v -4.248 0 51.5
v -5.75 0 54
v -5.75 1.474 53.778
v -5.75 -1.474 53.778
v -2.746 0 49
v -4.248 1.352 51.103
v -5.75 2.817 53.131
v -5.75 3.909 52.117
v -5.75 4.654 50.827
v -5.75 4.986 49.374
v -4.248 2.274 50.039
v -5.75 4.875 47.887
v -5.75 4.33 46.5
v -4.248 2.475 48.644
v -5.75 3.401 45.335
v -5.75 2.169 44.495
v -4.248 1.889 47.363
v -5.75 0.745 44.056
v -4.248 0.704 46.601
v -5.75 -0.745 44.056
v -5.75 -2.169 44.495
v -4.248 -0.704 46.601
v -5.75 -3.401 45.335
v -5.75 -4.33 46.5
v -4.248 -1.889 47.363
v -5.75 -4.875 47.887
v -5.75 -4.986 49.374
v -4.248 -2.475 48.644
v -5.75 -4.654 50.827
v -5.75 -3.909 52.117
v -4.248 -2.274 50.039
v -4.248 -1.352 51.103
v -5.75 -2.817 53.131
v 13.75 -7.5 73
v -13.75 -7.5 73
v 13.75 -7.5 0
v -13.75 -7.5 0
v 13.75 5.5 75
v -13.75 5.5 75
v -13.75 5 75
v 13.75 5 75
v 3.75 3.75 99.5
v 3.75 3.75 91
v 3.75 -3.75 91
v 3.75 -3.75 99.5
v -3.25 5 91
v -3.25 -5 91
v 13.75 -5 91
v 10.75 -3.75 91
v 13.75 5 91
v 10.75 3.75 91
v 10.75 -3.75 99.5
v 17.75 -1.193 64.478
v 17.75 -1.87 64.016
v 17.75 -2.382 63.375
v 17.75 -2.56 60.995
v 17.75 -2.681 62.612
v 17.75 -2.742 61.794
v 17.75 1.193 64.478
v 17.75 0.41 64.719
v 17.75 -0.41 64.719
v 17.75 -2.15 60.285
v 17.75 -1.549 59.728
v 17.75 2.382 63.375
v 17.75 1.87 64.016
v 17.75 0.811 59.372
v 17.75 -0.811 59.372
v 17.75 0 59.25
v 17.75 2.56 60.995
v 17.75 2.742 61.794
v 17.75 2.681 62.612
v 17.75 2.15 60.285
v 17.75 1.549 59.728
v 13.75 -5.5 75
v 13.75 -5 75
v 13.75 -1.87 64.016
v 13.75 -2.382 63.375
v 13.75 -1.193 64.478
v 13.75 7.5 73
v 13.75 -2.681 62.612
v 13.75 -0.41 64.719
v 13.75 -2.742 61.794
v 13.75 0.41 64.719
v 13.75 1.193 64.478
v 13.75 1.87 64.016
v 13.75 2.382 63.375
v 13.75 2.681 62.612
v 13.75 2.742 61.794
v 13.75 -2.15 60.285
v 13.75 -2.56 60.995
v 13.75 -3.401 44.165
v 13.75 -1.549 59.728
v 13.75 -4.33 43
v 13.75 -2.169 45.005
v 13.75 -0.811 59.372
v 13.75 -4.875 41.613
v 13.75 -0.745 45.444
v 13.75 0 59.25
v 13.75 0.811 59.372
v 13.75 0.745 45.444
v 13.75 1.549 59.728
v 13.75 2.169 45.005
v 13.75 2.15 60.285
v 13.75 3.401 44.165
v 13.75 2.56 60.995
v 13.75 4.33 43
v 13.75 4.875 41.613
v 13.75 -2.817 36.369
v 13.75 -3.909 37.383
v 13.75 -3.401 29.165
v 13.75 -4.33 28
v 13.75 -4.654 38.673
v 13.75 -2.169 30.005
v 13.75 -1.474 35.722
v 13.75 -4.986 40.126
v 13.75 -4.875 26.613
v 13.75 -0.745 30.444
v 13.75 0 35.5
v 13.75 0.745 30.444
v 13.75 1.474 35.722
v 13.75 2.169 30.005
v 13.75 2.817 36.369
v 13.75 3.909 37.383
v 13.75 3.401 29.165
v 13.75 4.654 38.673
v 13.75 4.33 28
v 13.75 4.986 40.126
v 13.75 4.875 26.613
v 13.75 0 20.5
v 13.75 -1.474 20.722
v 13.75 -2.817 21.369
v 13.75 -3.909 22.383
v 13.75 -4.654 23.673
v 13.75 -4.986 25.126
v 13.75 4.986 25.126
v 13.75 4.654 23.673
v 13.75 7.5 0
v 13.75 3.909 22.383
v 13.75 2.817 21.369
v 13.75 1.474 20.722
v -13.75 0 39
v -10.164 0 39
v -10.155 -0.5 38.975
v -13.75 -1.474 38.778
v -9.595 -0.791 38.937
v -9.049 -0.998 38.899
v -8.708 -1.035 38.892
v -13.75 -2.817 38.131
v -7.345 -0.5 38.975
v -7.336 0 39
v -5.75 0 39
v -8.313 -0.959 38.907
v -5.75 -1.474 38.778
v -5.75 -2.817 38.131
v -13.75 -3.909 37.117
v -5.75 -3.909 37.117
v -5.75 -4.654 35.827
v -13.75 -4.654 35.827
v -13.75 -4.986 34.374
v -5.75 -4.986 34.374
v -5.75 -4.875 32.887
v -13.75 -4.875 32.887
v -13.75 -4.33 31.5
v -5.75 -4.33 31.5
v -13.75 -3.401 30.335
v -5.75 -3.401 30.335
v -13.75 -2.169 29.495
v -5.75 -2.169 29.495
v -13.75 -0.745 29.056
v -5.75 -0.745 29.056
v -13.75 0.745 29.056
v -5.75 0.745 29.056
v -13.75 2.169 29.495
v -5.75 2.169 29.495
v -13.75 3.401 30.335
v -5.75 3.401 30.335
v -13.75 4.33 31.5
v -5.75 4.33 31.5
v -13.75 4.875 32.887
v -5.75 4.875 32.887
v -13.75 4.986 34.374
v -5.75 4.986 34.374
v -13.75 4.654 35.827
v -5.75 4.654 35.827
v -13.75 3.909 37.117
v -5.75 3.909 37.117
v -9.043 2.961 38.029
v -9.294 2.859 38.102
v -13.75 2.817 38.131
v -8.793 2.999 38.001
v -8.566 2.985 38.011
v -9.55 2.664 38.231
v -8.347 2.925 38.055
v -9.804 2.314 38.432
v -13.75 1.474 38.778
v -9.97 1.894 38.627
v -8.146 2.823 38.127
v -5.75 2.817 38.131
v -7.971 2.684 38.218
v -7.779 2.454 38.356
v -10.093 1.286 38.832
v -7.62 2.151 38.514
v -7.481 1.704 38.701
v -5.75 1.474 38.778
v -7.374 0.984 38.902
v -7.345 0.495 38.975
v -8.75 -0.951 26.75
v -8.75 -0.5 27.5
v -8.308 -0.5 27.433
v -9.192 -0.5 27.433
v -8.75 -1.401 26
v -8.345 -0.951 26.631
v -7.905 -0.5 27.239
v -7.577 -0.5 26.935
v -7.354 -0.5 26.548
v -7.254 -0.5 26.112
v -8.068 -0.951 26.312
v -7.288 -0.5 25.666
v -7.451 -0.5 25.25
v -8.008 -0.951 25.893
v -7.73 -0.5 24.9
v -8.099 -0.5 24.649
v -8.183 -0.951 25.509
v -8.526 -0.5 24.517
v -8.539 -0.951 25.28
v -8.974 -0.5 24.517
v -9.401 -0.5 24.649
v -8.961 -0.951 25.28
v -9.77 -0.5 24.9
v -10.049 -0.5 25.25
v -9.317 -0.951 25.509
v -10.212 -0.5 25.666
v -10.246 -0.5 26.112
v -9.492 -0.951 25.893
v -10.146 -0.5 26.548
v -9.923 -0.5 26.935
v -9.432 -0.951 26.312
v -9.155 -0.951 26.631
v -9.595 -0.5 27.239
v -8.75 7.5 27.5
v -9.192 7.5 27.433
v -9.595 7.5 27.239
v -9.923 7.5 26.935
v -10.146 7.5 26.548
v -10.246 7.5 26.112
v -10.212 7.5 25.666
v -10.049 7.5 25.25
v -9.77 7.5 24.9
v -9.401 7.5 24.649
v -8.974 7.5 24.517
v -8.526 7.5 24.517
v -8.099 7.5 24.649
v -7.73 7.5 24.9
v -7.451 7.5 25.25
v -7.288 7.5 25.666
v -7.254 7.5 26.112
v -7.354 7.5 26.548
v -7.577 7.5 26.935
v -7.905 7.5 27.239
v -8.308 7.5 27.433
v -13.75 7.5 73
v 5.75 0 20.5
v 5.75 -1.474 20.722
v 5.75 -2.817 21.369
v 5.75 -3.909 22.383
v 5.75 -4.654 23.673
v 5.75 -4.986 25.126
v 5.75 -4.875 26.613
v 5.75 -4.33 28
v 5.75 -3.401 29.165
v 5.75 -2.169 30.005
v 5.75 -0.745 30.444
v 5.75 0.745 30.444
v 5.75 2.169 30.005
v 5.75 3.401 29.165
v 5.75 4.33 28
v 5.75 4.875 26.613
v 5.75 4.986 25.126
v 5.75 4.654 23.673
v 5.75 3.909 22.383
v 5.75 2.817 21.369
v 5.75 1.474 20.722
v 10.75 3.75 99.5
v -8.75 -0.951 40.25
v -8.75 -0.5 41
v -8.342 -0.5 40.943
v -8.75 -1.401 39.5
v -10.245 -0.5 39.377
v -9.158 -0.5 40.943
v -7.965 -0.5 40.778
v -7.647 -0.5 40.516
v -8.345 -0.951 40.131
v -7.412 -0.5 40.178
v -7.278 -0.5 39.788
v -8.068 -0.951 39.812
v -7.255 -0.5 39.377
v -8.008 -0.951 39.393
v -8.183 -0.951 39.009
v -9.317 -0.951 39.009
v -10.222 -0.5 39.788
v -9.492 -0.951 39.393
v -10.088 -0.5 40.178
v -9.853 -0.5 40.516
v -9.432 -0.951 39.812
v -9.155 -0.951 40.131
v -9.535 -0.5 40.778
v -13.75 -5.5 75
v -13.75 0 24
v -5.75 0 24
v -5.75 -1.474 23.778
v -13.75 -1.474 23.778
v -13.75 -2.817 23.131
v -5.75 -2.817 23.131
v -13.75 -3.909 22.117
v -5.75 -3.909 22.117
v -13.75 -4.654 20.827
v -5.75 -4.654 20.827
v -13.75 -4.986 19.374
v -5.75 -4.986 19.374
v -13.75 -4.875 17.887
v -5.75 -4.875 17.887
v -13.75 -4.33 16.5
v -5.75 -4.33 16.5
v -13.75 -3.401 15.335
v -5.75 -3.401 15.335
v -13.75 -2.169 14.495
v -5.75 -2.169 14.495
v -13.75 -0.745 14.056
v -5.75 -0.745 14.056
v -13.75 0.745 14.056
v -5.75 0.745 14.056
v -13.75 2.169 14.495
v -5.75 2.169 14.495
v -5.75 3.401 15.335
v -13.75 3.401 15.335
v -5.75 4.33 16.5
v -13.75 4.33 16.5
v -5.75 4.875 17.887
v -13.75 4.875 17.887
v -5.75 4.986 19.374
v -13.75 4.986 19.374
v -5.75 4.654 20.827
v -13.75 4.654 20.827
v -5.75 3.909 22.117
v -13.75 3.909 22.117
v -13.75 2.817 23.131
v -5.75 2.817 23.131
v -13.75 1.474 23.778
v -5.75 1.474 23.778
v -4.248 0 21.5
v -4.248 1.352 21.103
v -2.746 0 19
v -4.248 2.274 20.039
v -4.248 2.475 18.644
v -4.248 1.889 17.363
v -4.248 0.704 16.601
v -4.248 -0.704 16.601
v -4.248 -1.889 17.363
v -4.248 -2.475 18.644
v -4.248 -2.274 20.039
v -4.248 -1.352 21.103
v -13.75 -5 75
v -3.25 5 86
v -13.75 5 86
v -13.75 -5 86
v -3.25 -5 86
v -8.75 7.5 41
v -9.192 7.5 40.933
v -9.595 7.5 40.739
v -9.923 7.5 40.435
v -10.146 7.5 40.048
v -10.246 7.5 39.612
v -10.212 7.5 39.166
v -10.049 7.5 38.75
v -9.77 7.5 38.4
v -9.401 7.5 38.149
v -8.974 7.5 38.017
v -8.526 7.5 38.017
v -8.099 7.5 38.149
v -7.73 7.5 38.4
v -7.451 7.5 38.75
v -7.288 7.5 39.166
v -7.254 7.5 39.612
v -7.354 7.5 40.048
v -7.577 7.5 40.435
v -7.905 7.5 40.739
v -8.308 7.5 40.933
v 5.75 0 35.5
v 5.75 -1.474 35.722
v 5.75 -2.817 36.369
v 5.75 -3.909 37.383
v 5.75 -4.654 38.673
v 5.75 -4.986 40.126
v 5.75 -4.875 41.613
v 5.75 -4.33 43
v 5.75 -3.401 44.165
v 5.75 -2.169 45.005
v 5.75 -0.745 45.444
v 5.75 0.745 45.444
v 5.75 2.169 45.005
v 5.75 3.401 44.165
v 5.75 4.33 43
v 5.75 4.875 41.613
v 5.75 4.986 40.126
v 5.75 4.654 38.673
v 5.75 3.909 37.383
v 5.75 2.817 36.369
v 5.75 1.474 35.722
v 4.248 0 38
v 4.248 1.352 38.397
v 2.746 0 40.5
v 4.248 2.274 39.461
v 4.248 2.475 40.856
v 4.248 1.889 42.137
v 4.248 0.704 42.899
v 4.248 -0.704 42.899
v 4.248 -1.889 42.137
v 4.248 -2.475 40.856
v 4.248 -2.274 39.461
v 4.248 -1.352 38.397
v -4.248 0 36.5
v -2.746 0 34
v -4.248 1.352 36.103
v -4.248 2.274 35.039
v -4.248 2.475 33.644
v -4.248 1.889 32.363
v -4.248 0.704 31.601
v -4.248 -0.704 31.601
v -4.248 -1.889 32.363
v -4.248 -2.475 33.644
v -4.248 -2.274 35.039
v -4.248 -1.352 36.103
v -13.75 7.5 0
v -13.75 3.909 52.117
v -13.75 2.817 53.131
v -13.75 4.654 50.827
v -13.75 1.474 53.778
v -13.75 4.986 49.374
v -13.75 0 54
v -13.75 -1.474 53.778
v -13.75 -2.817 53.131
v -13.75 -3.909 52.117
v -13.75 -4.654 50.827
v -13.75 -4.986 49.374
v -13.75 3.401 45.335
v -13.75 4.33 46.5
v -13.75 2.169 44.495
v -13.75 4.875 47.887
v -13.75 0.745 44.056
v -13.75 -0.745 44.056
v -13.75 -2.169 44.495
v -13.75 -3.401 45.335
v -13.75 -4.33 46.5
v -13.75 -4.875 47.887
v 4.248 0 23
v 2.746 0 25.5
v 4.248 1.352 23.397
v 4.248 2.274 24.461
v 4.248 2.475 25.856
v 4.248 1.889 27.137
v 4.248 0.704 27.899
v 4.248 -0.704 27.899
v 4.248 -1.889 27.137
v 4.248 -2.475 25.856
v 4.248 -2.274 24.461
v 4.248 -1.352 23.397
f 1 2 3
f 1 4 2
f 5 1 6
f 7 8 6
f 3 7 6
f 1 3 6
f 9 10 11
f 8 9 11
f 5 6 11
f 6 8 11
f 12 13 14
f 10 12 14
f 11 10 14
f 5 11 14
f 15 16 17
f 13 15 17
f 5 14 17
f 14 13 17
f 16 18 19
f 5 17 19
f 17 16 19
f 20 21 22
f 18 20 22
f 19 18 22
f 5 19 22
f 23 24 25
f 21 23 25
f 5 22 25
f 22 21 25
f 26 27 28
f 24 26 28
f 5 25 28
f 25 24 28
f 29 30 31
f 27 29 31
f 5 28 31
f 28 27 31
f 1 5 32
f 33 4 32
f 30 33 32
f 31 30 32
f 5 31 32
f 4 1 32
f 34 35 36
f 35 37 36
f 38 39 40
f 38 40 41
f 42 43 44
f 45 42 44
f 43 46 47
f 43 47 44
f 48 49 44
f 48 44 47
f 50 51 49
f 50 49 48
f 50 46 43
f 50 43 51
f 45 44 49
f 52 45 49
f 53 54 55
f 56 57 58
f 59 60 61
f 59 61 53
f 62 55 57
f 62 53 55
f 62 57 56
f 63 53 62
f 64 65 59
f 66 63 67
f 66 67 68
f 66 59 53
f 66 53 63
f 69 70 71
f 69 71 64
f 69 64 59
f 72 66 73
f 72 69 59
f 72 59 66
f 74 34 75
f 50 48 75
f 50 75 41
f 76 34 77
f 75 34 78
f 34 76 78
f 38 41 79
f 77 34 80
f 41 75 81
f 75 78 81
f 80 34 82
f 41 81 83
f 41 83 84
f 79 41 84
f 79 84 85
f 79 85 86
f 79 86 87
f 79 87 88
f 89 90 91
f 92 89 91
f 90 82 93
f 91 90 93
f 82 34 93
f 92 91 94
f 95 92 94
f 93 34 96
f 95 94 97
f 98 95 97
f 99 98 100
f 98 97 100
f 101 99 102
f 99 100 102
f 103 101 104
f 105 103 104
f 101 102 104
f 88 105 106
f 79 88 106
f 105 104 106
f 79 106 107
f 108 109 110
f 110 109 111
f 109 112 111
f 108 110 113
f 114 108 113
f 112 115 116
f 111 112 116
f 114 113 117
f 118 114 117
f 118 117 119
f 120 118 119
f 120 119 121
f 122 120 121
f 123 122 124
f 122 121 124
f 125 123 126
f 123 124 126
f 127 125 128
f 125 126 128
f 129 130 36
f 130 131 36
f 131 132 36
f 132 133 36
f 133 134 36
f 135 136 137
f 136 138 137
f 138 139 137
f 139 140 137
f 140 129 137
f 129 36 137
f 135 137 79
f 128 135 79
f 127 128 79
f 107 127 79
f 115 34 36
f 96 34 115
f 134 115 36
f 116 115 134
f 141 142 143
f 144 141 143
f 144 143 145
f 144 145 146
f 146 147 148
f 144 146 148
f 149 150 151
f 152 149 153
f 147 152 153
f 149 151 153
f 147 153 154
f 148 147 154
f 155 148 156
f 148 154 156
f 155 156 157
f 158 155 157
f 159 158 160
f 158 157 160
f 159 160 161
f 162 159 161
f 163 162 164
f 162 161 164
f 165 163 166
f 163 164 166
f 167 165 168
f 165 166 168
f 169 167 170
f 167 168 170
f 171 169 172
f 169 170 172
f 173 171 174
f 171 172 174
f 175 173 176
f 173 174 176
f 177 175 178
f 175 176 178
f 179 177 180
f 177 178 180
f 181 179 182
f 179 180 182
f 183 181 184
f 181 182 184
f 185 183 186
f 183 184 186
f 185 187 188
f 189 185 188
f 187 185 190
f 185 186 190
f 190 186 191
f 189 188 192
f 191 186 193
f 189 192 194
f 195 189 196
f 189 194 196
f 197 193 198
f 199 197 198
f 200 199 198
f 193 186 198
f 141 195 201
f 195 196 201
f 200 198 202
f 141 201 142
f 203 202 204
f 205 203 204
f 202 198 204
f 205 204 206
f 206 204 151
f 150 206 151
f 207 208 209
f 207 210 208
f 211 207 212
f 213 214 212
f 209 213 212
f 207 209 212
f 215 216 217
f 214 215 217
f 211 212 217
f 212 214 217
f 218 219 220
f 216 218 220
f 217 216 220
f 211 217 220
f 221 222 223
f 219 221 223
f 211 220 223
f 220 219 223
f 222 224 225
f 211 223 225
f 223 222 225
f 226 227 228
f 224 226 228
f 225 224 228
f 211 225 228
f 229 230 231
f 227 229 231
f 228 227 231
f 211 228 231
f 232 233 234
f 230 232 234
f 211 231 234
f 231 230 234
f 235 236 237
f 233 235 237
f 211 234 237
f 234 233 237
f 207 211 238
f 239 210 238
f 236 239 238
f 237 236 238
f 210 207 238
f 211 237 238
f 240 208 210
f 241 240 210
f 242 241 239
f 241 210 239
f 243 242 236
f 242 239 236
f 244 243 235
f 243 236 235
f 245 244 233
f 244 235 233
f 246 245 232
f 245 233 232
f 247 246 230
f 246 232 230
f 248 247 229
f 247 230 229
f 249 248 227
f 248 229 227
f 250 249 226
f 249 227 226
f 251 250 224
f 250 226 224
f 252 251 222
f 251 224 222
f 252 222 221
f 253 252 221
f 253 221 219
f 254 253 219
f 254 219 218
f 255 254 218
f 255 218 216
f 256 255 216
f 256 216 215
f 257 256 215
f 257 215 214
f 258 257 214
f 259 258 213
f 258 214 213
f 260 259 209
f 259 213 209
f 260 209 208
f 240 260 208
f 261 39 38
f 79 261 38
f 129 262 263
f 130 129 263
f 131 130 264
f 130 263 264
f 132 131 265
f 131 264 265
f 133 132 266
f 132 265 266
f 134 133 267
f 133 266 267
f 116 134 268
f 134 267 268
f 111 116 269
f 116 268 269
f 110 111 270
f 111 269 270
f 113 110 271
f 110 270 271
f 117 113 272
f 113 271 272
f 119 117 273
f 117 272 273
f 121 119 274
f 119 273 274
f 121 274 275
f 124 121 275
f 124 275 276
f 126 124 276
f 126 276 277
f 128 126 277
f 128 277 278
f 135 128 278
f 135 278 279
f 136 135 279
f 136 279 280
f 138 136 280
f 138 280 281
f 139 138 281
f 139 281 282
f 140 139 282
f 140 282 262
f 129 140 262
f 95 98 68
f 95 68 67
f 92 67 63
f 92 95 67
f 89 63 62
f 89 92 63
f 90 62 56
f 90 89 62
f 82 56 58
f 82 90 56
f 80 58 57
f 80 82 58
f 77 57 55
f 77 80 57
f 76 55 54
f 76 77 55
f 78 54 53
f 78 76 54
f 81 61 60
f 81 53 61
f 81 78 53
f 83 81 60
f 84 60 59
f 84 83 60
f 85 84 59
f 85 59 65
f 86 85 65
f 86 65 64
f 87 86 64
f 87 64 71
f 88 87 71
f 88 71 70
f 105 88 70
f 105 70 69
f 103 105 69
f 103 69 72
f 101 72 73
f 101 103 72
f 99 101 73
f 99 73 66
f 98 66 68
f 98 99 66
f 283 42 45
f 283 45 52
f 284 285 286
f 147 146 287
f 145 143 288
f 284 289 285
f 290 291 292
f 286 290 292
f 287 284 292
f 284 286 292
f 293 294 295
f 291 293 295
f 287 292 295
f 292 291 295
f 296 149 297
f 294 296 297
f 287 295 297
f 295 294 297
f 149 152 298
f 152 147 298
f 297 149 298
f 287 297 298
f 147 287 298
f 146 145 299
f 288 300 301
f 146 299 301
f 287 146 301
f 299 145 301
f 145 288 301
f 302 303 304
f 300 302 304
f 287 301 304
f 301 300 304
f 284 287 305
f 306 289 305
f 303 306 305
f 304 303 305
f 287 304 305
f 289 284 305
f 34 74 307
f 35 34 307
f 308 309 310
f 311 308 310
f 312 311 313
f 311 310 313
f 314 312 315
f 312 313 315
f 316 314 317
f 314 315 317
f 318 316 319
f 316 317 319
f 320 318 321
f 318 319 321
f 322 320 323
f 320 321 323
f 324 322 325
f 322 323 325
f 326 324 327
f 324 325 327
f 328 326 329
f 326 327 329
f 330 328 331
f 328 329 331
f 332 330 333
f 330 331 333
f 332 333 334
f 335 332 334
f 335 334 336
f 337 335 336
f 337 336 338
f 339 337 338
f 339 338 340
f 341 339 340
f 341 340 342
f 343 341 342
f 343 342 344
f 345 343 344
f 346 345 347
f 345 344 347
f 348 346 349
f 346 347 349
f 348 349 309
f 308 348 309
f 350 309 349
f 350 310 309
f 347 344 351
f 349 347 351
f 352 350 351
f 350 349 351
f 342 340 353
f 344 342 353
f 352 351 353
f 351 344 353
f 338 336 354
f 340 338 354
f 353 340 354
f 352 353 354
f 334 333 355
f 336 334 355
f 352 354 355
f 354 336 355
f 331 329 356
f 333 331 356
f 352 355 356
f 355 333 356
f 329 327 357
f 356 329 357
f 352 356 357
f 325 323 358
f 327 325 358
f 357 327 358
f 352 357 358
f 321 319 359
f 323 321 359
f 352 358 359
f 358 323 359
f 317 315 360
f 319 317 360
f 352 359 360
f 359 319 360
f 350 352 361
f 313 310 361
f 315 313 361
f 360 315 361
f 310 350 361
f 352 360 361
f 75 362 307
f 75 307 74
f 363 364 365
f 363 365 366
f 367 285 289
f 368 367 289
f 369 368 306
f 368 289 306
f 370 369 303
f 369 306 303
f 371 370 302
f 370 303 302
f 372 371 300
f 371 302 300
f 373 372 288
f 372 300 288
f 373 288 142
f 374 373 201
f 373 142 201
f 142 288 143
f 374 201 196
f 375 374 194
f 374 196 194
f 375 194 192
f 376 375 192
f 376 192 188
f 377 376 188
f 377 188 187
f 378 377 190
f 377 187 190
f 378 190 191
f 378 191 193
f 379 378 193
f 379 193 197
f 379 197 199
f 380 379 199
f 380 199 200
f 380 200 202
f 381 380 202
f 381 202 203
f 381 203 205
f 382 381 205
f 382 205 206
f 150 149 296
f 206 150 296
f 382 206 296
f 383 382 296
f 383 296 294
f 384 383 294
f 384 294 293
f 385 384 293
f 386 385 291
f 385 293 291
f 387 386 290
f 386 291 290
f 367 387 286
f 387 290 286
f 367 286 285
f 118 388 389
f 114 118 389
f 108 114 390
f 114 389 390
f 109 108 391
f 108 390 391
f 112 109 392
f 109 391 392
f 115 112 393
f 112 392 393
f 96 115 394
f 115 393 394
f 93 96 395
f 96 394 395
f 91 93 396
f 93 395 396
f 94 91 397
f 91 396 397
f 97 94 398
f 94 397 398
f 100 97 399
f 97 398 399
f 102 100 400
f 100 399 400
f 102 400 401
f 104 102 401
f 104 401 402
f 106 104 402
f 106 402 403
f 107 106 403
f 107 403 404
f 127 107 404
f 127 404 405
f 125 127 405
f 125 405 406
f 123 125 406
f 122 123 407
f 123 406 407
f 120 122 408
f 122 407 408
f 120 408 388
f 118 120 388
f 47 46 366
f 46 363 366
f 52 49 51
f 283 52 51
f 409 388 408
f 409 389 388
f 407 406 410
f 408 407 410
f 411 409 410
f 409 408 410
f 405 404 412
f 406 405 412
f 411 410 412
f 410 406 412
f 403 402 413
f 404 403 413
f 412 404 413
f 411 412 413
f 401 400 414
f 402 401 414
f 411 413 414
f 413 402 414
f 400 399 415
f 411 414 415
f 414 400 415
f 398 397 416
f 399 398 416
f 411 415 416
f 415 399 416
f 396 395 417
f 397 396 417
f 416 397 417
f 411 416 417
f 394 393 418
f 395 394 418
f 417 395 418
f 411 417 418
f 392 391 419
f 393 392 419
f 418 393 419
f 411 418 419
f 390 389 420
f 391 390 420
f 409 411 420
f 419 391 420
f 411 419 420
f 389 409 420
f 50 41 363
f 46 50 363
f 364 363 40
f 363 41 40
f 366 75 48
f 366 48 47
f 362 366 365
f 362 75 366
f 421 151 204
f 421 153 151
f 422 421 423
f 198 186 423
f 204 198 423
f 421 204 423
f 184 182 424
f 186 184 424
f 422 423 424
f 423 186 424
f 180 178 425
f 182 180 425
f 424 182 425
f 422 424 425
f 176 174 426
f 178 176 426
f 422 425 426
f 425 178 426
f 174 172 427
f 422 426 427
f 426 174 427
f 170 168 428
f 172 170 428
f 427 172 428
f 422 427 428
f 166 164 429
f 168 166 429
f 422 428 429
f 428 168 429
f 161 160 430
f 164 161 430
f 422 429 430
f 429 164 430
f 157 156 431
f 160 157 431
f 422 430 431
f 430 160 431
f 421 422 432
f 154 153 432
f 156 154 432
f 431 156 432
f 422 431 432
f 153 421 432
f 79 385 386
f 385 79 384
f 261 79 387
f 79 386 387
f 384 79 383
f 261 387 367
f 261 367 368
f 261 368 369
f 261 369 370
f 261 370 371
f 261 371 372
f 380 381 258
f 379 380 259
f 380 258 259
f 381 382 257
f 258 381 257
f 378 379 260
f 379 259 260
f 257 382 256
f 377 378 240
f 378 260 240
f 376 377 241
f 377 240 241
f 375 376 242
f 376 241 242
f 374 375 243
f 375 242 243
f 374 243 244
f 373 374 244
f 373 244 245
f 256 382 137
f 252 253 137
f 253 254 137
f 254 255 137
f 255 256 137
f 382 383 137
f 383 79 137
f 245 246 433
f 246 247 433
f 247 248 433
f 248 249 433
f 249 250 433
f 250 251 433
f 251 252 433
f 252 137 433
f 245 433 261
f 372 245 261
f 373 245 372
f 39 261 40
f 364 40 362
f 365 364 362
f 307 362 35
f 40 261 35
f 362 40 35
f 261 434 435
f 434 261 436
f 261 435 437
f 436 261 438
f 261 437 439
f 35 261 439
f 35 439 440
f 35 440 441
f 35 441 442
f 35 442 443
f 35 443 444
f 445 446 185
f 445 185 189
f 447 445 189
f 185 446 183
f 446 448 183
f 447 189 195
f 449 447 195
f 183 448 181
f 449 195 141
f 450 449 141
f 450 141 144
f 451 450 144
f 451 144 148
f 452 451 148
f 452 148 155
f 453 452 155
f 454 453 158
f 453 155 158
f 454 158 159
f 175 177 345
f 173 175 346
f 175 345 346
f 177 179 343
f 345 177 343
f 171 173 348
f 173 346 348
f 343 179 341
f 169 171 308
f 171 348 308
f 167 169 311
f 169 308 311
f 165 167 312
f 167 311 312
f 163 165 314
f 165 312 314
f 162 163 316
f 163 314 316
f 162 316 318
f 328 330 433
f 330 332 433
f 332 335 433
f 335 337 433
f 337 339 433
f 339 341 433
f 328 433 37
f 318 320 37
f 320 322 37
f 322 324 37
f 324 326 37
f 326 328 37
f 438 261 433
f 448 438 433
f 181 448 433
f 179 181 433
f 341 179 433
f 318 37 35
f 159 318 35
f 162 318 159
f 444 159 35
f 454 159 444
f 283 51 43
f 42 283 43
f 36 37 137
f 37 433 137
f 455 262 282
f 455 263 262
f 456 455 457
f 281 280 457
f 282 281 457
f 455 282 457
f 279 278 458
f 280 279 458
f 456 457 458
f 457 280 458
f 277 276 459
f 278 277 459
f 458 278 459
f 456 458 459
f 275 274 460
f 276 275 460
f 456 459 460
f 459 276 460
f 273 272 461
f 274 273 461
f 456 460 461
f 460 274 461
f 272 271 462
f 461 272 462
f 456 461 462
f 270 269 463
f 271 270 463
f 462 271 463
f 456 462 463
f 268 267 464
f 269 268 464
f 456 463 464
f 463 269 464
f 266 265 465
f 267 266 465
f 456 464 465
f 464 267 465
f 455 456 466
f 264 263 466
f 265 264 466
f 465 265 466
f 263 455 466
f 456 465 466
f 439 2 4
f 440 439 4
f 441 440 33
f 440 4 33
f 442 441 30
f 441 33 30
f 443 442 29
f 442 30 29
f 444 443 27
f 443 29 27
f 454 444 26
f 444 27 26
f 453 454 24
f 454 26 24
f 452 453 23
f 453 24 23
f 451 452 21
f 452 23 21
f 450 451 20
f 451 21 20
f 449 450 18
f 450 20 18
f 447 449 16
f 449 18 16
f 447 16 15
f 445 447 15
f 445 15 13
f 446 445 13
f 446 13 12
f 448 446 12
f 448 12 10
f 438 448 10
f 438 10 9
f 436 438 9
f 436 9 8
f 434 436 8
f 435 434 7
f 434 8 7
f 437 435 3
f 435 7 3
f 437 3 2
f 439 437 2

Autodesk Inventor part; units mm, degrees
ref_plane "YZ Plane" through (0, 0, 0) normal (1, 0, 0) x (0, 1, 0)
ref_plane "XZ Plane" through (0, 0, 0) normal (0, 1, 0) x (-1, 0, 0)
ref_plane "XY Plane" through (0, 0, 0) normal (0, 0, 1) x (1, 0, 0)
sketch "スケッチ1" plane through (0, 0, 0) normal (0, 0, 1) x (1, 0, 0)
  line L0 (-13.75, -7.5) -> (13.75, -7.5)
  line L1 (13.75, -7.5) -> (13.75, 7.5)
  line L2 (13.75, 7.5) -> (-13.75, 7.5)
  line L3 (-13.75, 7.5) -> (-13.75, -7.5)
  line L4 (-13.75, -7.5) -> (13.75, 7.5) construction
  line L5 (13.75, -7.5) -> (-13.75, 7.5) construction
  point P0 (0, 0)
  dimension "d0" = 27.5
  dimension "d1" = 15
extrude "押し出し1" add sketch "スケッチ1" along normal blind 75
sketch "スケッチ2" plane through (0, 0, 75) normal (0, 0, 1) x (1, 0, 0)
  line L0 (-13.75, 5) -> (13.75, 5)
  line L1 (13.75, 5) -> (13.75, -5)
  line L2 (13.75, -5) -> (-13.75, -5)
  line L3 (-13.75, -5) -> (-13.75, 5)
  line L4 (-13.75, 5) -> (13.75, -5) construction
  line L5 (13.75, 5) -> (-13.75, -5) construction
  point P0 (0, 0)
  dimension "d4" = 27.5
  dimension "d5" = 10
extrude "押し出し2" add sketch "スケッチ2" along normal blind 11
chamfer "面取り1" distance 2 angle 45 2 edges at (0, 7.5, 75) (0, -7.5, 75)
sketch "スケッチ3" plane through (0, 0, 86) normal (0, 0, 1) x (1, 0, 0)
  line L0 (13.75, -5) -> (13.75, 5) projected
  line L1 (13.75, -5) -> (-13.75, -5) projected
  line L2 (13.75, 5) -> (-3.25, 5)
  line L3 (-3.25, 5) -> (-3.25, -5)
  line L4 (-3.25, -5) -> (13.75, -5)
  line L5 (13.75, -5) -> (13.75, 5)
  point P0 (0, 0)
  dimension "d11" = 17
extrude "押し出し3" add sketch "スケッチ3" along normal blind 5
sketch "スケッチ4" plane through (0, 0, 91) normal (0, 0, 1) x (1, 0, 0)
  line L0 (3.75, -3.75) -> (10.75, -3.75)
  line L1 (10.75, -3.75) -> (10.75, 3.75)
  line L2 (10.75, 3.75) -> (3.75, 3.75)
  line L3 (3.75, 3.75) -> (3.75, -3.75)
  line L4 (3.75, -3.75) -> (10.75, 3.75) construction
  line L5 (10.75, -3.75) -> (3.75, 3.75) construction
  line L6 (13.75, -5) -> (13.75, 5) projected
  point P0 (0, 0)
  point P1 (7.25, 0)
  dimension "d14" = 7
  dimension "d15" = 7.5
  dimension "d16" = 3
extrude "押し出し4" add sketch "スケッチ4" along normal blind 8.5
sketch "スケッチ5" plane through (13.75, -7.5, 0) normal (1, 0, 0) x (0, 0, -1)
  line L0 (0, 7.5) -> (-91, 7.5) construction
  line L1 (-91, 2.5) -> (-91, 12.5) projected
  line L2 (0, 0) -> (0, 15) projected
  point P0 (-25.5, 7.5)
  point P1 (-40.5, 7.5)
  dimension "d19" = 25.5
  dimension "d20" = 15
hole "穴1" at (13.75, 0, 25.5) at (13.75, 0, 40.5) direction (-1, 0, 0) diameter 10 depth 8 tip angle 118
sketch "スケッチ6" plane through (-13.75, -7.5, 0) normal (-1, 0, 0) x (0, 0, 1)
  line L0 (0, 7.5) -> (86, 7.5) construction
  line L1 (86, 2.5) -> (86, 12.5) projected
  line L2 (0, 15) -> (0, 0) projected
  point P0 (34, 7.5)
  point P1 (19, 7.5)
  point P2 (49, 7.5)
  dimension "d28" = 19
  dimension "d29" = 15
  dimension "d30" = 15
hole "穴2" at (-13.75, 0, 34) at (-13.75, 0, 19) at (-13.75, 0, 49) direction (1, 0, 0) diameter 10 depth 8 tip angle 118
sketch "スケッチ7" plane through (-13.75, 7.5, 0) normal (0, 1, 0) x (1, 0, 0)
  line L0 (27.5, 0) -> (0, 0) projected
  line L1 (5, 0) -> (5, -72.92) construction
  line L2 (0, 0) -> (0, -73) projected
  point P0 (13.75, 0)
  point P1 (5, -26)
  point P2 (5, -39.5)
  dimension "d38" = 5
  dimension "d39" = 26
  dimension "d40" = 13.5
hole "穴3" at (-8.75, 7.5, 26) at (-8.75, 7.5, 39.5) direction (0, -1, 0) diameter 3 depth 8 tip angle 118
sketch "スケッチ8" plane through (13.75, -7.5, 0) normal (1, 0, 0) x (0, 0, -1)
  line L0 (0, 7.5) -> (-99.5, 7.5) construction
  line L1 (-99.5, 3.75) -> (-99.5, 11.25) projected
  circle A0 centre (-62, 7.5) radius 2.75
  line L2 (0, 0) -> (0, 15) projected
  dimension "d48" = 5.5
  dimension "d49" = 62
extrude "押し出し5" add sketch "スケッチ8" along normal blind 4
properties part number "solenoid _valve_sa"
